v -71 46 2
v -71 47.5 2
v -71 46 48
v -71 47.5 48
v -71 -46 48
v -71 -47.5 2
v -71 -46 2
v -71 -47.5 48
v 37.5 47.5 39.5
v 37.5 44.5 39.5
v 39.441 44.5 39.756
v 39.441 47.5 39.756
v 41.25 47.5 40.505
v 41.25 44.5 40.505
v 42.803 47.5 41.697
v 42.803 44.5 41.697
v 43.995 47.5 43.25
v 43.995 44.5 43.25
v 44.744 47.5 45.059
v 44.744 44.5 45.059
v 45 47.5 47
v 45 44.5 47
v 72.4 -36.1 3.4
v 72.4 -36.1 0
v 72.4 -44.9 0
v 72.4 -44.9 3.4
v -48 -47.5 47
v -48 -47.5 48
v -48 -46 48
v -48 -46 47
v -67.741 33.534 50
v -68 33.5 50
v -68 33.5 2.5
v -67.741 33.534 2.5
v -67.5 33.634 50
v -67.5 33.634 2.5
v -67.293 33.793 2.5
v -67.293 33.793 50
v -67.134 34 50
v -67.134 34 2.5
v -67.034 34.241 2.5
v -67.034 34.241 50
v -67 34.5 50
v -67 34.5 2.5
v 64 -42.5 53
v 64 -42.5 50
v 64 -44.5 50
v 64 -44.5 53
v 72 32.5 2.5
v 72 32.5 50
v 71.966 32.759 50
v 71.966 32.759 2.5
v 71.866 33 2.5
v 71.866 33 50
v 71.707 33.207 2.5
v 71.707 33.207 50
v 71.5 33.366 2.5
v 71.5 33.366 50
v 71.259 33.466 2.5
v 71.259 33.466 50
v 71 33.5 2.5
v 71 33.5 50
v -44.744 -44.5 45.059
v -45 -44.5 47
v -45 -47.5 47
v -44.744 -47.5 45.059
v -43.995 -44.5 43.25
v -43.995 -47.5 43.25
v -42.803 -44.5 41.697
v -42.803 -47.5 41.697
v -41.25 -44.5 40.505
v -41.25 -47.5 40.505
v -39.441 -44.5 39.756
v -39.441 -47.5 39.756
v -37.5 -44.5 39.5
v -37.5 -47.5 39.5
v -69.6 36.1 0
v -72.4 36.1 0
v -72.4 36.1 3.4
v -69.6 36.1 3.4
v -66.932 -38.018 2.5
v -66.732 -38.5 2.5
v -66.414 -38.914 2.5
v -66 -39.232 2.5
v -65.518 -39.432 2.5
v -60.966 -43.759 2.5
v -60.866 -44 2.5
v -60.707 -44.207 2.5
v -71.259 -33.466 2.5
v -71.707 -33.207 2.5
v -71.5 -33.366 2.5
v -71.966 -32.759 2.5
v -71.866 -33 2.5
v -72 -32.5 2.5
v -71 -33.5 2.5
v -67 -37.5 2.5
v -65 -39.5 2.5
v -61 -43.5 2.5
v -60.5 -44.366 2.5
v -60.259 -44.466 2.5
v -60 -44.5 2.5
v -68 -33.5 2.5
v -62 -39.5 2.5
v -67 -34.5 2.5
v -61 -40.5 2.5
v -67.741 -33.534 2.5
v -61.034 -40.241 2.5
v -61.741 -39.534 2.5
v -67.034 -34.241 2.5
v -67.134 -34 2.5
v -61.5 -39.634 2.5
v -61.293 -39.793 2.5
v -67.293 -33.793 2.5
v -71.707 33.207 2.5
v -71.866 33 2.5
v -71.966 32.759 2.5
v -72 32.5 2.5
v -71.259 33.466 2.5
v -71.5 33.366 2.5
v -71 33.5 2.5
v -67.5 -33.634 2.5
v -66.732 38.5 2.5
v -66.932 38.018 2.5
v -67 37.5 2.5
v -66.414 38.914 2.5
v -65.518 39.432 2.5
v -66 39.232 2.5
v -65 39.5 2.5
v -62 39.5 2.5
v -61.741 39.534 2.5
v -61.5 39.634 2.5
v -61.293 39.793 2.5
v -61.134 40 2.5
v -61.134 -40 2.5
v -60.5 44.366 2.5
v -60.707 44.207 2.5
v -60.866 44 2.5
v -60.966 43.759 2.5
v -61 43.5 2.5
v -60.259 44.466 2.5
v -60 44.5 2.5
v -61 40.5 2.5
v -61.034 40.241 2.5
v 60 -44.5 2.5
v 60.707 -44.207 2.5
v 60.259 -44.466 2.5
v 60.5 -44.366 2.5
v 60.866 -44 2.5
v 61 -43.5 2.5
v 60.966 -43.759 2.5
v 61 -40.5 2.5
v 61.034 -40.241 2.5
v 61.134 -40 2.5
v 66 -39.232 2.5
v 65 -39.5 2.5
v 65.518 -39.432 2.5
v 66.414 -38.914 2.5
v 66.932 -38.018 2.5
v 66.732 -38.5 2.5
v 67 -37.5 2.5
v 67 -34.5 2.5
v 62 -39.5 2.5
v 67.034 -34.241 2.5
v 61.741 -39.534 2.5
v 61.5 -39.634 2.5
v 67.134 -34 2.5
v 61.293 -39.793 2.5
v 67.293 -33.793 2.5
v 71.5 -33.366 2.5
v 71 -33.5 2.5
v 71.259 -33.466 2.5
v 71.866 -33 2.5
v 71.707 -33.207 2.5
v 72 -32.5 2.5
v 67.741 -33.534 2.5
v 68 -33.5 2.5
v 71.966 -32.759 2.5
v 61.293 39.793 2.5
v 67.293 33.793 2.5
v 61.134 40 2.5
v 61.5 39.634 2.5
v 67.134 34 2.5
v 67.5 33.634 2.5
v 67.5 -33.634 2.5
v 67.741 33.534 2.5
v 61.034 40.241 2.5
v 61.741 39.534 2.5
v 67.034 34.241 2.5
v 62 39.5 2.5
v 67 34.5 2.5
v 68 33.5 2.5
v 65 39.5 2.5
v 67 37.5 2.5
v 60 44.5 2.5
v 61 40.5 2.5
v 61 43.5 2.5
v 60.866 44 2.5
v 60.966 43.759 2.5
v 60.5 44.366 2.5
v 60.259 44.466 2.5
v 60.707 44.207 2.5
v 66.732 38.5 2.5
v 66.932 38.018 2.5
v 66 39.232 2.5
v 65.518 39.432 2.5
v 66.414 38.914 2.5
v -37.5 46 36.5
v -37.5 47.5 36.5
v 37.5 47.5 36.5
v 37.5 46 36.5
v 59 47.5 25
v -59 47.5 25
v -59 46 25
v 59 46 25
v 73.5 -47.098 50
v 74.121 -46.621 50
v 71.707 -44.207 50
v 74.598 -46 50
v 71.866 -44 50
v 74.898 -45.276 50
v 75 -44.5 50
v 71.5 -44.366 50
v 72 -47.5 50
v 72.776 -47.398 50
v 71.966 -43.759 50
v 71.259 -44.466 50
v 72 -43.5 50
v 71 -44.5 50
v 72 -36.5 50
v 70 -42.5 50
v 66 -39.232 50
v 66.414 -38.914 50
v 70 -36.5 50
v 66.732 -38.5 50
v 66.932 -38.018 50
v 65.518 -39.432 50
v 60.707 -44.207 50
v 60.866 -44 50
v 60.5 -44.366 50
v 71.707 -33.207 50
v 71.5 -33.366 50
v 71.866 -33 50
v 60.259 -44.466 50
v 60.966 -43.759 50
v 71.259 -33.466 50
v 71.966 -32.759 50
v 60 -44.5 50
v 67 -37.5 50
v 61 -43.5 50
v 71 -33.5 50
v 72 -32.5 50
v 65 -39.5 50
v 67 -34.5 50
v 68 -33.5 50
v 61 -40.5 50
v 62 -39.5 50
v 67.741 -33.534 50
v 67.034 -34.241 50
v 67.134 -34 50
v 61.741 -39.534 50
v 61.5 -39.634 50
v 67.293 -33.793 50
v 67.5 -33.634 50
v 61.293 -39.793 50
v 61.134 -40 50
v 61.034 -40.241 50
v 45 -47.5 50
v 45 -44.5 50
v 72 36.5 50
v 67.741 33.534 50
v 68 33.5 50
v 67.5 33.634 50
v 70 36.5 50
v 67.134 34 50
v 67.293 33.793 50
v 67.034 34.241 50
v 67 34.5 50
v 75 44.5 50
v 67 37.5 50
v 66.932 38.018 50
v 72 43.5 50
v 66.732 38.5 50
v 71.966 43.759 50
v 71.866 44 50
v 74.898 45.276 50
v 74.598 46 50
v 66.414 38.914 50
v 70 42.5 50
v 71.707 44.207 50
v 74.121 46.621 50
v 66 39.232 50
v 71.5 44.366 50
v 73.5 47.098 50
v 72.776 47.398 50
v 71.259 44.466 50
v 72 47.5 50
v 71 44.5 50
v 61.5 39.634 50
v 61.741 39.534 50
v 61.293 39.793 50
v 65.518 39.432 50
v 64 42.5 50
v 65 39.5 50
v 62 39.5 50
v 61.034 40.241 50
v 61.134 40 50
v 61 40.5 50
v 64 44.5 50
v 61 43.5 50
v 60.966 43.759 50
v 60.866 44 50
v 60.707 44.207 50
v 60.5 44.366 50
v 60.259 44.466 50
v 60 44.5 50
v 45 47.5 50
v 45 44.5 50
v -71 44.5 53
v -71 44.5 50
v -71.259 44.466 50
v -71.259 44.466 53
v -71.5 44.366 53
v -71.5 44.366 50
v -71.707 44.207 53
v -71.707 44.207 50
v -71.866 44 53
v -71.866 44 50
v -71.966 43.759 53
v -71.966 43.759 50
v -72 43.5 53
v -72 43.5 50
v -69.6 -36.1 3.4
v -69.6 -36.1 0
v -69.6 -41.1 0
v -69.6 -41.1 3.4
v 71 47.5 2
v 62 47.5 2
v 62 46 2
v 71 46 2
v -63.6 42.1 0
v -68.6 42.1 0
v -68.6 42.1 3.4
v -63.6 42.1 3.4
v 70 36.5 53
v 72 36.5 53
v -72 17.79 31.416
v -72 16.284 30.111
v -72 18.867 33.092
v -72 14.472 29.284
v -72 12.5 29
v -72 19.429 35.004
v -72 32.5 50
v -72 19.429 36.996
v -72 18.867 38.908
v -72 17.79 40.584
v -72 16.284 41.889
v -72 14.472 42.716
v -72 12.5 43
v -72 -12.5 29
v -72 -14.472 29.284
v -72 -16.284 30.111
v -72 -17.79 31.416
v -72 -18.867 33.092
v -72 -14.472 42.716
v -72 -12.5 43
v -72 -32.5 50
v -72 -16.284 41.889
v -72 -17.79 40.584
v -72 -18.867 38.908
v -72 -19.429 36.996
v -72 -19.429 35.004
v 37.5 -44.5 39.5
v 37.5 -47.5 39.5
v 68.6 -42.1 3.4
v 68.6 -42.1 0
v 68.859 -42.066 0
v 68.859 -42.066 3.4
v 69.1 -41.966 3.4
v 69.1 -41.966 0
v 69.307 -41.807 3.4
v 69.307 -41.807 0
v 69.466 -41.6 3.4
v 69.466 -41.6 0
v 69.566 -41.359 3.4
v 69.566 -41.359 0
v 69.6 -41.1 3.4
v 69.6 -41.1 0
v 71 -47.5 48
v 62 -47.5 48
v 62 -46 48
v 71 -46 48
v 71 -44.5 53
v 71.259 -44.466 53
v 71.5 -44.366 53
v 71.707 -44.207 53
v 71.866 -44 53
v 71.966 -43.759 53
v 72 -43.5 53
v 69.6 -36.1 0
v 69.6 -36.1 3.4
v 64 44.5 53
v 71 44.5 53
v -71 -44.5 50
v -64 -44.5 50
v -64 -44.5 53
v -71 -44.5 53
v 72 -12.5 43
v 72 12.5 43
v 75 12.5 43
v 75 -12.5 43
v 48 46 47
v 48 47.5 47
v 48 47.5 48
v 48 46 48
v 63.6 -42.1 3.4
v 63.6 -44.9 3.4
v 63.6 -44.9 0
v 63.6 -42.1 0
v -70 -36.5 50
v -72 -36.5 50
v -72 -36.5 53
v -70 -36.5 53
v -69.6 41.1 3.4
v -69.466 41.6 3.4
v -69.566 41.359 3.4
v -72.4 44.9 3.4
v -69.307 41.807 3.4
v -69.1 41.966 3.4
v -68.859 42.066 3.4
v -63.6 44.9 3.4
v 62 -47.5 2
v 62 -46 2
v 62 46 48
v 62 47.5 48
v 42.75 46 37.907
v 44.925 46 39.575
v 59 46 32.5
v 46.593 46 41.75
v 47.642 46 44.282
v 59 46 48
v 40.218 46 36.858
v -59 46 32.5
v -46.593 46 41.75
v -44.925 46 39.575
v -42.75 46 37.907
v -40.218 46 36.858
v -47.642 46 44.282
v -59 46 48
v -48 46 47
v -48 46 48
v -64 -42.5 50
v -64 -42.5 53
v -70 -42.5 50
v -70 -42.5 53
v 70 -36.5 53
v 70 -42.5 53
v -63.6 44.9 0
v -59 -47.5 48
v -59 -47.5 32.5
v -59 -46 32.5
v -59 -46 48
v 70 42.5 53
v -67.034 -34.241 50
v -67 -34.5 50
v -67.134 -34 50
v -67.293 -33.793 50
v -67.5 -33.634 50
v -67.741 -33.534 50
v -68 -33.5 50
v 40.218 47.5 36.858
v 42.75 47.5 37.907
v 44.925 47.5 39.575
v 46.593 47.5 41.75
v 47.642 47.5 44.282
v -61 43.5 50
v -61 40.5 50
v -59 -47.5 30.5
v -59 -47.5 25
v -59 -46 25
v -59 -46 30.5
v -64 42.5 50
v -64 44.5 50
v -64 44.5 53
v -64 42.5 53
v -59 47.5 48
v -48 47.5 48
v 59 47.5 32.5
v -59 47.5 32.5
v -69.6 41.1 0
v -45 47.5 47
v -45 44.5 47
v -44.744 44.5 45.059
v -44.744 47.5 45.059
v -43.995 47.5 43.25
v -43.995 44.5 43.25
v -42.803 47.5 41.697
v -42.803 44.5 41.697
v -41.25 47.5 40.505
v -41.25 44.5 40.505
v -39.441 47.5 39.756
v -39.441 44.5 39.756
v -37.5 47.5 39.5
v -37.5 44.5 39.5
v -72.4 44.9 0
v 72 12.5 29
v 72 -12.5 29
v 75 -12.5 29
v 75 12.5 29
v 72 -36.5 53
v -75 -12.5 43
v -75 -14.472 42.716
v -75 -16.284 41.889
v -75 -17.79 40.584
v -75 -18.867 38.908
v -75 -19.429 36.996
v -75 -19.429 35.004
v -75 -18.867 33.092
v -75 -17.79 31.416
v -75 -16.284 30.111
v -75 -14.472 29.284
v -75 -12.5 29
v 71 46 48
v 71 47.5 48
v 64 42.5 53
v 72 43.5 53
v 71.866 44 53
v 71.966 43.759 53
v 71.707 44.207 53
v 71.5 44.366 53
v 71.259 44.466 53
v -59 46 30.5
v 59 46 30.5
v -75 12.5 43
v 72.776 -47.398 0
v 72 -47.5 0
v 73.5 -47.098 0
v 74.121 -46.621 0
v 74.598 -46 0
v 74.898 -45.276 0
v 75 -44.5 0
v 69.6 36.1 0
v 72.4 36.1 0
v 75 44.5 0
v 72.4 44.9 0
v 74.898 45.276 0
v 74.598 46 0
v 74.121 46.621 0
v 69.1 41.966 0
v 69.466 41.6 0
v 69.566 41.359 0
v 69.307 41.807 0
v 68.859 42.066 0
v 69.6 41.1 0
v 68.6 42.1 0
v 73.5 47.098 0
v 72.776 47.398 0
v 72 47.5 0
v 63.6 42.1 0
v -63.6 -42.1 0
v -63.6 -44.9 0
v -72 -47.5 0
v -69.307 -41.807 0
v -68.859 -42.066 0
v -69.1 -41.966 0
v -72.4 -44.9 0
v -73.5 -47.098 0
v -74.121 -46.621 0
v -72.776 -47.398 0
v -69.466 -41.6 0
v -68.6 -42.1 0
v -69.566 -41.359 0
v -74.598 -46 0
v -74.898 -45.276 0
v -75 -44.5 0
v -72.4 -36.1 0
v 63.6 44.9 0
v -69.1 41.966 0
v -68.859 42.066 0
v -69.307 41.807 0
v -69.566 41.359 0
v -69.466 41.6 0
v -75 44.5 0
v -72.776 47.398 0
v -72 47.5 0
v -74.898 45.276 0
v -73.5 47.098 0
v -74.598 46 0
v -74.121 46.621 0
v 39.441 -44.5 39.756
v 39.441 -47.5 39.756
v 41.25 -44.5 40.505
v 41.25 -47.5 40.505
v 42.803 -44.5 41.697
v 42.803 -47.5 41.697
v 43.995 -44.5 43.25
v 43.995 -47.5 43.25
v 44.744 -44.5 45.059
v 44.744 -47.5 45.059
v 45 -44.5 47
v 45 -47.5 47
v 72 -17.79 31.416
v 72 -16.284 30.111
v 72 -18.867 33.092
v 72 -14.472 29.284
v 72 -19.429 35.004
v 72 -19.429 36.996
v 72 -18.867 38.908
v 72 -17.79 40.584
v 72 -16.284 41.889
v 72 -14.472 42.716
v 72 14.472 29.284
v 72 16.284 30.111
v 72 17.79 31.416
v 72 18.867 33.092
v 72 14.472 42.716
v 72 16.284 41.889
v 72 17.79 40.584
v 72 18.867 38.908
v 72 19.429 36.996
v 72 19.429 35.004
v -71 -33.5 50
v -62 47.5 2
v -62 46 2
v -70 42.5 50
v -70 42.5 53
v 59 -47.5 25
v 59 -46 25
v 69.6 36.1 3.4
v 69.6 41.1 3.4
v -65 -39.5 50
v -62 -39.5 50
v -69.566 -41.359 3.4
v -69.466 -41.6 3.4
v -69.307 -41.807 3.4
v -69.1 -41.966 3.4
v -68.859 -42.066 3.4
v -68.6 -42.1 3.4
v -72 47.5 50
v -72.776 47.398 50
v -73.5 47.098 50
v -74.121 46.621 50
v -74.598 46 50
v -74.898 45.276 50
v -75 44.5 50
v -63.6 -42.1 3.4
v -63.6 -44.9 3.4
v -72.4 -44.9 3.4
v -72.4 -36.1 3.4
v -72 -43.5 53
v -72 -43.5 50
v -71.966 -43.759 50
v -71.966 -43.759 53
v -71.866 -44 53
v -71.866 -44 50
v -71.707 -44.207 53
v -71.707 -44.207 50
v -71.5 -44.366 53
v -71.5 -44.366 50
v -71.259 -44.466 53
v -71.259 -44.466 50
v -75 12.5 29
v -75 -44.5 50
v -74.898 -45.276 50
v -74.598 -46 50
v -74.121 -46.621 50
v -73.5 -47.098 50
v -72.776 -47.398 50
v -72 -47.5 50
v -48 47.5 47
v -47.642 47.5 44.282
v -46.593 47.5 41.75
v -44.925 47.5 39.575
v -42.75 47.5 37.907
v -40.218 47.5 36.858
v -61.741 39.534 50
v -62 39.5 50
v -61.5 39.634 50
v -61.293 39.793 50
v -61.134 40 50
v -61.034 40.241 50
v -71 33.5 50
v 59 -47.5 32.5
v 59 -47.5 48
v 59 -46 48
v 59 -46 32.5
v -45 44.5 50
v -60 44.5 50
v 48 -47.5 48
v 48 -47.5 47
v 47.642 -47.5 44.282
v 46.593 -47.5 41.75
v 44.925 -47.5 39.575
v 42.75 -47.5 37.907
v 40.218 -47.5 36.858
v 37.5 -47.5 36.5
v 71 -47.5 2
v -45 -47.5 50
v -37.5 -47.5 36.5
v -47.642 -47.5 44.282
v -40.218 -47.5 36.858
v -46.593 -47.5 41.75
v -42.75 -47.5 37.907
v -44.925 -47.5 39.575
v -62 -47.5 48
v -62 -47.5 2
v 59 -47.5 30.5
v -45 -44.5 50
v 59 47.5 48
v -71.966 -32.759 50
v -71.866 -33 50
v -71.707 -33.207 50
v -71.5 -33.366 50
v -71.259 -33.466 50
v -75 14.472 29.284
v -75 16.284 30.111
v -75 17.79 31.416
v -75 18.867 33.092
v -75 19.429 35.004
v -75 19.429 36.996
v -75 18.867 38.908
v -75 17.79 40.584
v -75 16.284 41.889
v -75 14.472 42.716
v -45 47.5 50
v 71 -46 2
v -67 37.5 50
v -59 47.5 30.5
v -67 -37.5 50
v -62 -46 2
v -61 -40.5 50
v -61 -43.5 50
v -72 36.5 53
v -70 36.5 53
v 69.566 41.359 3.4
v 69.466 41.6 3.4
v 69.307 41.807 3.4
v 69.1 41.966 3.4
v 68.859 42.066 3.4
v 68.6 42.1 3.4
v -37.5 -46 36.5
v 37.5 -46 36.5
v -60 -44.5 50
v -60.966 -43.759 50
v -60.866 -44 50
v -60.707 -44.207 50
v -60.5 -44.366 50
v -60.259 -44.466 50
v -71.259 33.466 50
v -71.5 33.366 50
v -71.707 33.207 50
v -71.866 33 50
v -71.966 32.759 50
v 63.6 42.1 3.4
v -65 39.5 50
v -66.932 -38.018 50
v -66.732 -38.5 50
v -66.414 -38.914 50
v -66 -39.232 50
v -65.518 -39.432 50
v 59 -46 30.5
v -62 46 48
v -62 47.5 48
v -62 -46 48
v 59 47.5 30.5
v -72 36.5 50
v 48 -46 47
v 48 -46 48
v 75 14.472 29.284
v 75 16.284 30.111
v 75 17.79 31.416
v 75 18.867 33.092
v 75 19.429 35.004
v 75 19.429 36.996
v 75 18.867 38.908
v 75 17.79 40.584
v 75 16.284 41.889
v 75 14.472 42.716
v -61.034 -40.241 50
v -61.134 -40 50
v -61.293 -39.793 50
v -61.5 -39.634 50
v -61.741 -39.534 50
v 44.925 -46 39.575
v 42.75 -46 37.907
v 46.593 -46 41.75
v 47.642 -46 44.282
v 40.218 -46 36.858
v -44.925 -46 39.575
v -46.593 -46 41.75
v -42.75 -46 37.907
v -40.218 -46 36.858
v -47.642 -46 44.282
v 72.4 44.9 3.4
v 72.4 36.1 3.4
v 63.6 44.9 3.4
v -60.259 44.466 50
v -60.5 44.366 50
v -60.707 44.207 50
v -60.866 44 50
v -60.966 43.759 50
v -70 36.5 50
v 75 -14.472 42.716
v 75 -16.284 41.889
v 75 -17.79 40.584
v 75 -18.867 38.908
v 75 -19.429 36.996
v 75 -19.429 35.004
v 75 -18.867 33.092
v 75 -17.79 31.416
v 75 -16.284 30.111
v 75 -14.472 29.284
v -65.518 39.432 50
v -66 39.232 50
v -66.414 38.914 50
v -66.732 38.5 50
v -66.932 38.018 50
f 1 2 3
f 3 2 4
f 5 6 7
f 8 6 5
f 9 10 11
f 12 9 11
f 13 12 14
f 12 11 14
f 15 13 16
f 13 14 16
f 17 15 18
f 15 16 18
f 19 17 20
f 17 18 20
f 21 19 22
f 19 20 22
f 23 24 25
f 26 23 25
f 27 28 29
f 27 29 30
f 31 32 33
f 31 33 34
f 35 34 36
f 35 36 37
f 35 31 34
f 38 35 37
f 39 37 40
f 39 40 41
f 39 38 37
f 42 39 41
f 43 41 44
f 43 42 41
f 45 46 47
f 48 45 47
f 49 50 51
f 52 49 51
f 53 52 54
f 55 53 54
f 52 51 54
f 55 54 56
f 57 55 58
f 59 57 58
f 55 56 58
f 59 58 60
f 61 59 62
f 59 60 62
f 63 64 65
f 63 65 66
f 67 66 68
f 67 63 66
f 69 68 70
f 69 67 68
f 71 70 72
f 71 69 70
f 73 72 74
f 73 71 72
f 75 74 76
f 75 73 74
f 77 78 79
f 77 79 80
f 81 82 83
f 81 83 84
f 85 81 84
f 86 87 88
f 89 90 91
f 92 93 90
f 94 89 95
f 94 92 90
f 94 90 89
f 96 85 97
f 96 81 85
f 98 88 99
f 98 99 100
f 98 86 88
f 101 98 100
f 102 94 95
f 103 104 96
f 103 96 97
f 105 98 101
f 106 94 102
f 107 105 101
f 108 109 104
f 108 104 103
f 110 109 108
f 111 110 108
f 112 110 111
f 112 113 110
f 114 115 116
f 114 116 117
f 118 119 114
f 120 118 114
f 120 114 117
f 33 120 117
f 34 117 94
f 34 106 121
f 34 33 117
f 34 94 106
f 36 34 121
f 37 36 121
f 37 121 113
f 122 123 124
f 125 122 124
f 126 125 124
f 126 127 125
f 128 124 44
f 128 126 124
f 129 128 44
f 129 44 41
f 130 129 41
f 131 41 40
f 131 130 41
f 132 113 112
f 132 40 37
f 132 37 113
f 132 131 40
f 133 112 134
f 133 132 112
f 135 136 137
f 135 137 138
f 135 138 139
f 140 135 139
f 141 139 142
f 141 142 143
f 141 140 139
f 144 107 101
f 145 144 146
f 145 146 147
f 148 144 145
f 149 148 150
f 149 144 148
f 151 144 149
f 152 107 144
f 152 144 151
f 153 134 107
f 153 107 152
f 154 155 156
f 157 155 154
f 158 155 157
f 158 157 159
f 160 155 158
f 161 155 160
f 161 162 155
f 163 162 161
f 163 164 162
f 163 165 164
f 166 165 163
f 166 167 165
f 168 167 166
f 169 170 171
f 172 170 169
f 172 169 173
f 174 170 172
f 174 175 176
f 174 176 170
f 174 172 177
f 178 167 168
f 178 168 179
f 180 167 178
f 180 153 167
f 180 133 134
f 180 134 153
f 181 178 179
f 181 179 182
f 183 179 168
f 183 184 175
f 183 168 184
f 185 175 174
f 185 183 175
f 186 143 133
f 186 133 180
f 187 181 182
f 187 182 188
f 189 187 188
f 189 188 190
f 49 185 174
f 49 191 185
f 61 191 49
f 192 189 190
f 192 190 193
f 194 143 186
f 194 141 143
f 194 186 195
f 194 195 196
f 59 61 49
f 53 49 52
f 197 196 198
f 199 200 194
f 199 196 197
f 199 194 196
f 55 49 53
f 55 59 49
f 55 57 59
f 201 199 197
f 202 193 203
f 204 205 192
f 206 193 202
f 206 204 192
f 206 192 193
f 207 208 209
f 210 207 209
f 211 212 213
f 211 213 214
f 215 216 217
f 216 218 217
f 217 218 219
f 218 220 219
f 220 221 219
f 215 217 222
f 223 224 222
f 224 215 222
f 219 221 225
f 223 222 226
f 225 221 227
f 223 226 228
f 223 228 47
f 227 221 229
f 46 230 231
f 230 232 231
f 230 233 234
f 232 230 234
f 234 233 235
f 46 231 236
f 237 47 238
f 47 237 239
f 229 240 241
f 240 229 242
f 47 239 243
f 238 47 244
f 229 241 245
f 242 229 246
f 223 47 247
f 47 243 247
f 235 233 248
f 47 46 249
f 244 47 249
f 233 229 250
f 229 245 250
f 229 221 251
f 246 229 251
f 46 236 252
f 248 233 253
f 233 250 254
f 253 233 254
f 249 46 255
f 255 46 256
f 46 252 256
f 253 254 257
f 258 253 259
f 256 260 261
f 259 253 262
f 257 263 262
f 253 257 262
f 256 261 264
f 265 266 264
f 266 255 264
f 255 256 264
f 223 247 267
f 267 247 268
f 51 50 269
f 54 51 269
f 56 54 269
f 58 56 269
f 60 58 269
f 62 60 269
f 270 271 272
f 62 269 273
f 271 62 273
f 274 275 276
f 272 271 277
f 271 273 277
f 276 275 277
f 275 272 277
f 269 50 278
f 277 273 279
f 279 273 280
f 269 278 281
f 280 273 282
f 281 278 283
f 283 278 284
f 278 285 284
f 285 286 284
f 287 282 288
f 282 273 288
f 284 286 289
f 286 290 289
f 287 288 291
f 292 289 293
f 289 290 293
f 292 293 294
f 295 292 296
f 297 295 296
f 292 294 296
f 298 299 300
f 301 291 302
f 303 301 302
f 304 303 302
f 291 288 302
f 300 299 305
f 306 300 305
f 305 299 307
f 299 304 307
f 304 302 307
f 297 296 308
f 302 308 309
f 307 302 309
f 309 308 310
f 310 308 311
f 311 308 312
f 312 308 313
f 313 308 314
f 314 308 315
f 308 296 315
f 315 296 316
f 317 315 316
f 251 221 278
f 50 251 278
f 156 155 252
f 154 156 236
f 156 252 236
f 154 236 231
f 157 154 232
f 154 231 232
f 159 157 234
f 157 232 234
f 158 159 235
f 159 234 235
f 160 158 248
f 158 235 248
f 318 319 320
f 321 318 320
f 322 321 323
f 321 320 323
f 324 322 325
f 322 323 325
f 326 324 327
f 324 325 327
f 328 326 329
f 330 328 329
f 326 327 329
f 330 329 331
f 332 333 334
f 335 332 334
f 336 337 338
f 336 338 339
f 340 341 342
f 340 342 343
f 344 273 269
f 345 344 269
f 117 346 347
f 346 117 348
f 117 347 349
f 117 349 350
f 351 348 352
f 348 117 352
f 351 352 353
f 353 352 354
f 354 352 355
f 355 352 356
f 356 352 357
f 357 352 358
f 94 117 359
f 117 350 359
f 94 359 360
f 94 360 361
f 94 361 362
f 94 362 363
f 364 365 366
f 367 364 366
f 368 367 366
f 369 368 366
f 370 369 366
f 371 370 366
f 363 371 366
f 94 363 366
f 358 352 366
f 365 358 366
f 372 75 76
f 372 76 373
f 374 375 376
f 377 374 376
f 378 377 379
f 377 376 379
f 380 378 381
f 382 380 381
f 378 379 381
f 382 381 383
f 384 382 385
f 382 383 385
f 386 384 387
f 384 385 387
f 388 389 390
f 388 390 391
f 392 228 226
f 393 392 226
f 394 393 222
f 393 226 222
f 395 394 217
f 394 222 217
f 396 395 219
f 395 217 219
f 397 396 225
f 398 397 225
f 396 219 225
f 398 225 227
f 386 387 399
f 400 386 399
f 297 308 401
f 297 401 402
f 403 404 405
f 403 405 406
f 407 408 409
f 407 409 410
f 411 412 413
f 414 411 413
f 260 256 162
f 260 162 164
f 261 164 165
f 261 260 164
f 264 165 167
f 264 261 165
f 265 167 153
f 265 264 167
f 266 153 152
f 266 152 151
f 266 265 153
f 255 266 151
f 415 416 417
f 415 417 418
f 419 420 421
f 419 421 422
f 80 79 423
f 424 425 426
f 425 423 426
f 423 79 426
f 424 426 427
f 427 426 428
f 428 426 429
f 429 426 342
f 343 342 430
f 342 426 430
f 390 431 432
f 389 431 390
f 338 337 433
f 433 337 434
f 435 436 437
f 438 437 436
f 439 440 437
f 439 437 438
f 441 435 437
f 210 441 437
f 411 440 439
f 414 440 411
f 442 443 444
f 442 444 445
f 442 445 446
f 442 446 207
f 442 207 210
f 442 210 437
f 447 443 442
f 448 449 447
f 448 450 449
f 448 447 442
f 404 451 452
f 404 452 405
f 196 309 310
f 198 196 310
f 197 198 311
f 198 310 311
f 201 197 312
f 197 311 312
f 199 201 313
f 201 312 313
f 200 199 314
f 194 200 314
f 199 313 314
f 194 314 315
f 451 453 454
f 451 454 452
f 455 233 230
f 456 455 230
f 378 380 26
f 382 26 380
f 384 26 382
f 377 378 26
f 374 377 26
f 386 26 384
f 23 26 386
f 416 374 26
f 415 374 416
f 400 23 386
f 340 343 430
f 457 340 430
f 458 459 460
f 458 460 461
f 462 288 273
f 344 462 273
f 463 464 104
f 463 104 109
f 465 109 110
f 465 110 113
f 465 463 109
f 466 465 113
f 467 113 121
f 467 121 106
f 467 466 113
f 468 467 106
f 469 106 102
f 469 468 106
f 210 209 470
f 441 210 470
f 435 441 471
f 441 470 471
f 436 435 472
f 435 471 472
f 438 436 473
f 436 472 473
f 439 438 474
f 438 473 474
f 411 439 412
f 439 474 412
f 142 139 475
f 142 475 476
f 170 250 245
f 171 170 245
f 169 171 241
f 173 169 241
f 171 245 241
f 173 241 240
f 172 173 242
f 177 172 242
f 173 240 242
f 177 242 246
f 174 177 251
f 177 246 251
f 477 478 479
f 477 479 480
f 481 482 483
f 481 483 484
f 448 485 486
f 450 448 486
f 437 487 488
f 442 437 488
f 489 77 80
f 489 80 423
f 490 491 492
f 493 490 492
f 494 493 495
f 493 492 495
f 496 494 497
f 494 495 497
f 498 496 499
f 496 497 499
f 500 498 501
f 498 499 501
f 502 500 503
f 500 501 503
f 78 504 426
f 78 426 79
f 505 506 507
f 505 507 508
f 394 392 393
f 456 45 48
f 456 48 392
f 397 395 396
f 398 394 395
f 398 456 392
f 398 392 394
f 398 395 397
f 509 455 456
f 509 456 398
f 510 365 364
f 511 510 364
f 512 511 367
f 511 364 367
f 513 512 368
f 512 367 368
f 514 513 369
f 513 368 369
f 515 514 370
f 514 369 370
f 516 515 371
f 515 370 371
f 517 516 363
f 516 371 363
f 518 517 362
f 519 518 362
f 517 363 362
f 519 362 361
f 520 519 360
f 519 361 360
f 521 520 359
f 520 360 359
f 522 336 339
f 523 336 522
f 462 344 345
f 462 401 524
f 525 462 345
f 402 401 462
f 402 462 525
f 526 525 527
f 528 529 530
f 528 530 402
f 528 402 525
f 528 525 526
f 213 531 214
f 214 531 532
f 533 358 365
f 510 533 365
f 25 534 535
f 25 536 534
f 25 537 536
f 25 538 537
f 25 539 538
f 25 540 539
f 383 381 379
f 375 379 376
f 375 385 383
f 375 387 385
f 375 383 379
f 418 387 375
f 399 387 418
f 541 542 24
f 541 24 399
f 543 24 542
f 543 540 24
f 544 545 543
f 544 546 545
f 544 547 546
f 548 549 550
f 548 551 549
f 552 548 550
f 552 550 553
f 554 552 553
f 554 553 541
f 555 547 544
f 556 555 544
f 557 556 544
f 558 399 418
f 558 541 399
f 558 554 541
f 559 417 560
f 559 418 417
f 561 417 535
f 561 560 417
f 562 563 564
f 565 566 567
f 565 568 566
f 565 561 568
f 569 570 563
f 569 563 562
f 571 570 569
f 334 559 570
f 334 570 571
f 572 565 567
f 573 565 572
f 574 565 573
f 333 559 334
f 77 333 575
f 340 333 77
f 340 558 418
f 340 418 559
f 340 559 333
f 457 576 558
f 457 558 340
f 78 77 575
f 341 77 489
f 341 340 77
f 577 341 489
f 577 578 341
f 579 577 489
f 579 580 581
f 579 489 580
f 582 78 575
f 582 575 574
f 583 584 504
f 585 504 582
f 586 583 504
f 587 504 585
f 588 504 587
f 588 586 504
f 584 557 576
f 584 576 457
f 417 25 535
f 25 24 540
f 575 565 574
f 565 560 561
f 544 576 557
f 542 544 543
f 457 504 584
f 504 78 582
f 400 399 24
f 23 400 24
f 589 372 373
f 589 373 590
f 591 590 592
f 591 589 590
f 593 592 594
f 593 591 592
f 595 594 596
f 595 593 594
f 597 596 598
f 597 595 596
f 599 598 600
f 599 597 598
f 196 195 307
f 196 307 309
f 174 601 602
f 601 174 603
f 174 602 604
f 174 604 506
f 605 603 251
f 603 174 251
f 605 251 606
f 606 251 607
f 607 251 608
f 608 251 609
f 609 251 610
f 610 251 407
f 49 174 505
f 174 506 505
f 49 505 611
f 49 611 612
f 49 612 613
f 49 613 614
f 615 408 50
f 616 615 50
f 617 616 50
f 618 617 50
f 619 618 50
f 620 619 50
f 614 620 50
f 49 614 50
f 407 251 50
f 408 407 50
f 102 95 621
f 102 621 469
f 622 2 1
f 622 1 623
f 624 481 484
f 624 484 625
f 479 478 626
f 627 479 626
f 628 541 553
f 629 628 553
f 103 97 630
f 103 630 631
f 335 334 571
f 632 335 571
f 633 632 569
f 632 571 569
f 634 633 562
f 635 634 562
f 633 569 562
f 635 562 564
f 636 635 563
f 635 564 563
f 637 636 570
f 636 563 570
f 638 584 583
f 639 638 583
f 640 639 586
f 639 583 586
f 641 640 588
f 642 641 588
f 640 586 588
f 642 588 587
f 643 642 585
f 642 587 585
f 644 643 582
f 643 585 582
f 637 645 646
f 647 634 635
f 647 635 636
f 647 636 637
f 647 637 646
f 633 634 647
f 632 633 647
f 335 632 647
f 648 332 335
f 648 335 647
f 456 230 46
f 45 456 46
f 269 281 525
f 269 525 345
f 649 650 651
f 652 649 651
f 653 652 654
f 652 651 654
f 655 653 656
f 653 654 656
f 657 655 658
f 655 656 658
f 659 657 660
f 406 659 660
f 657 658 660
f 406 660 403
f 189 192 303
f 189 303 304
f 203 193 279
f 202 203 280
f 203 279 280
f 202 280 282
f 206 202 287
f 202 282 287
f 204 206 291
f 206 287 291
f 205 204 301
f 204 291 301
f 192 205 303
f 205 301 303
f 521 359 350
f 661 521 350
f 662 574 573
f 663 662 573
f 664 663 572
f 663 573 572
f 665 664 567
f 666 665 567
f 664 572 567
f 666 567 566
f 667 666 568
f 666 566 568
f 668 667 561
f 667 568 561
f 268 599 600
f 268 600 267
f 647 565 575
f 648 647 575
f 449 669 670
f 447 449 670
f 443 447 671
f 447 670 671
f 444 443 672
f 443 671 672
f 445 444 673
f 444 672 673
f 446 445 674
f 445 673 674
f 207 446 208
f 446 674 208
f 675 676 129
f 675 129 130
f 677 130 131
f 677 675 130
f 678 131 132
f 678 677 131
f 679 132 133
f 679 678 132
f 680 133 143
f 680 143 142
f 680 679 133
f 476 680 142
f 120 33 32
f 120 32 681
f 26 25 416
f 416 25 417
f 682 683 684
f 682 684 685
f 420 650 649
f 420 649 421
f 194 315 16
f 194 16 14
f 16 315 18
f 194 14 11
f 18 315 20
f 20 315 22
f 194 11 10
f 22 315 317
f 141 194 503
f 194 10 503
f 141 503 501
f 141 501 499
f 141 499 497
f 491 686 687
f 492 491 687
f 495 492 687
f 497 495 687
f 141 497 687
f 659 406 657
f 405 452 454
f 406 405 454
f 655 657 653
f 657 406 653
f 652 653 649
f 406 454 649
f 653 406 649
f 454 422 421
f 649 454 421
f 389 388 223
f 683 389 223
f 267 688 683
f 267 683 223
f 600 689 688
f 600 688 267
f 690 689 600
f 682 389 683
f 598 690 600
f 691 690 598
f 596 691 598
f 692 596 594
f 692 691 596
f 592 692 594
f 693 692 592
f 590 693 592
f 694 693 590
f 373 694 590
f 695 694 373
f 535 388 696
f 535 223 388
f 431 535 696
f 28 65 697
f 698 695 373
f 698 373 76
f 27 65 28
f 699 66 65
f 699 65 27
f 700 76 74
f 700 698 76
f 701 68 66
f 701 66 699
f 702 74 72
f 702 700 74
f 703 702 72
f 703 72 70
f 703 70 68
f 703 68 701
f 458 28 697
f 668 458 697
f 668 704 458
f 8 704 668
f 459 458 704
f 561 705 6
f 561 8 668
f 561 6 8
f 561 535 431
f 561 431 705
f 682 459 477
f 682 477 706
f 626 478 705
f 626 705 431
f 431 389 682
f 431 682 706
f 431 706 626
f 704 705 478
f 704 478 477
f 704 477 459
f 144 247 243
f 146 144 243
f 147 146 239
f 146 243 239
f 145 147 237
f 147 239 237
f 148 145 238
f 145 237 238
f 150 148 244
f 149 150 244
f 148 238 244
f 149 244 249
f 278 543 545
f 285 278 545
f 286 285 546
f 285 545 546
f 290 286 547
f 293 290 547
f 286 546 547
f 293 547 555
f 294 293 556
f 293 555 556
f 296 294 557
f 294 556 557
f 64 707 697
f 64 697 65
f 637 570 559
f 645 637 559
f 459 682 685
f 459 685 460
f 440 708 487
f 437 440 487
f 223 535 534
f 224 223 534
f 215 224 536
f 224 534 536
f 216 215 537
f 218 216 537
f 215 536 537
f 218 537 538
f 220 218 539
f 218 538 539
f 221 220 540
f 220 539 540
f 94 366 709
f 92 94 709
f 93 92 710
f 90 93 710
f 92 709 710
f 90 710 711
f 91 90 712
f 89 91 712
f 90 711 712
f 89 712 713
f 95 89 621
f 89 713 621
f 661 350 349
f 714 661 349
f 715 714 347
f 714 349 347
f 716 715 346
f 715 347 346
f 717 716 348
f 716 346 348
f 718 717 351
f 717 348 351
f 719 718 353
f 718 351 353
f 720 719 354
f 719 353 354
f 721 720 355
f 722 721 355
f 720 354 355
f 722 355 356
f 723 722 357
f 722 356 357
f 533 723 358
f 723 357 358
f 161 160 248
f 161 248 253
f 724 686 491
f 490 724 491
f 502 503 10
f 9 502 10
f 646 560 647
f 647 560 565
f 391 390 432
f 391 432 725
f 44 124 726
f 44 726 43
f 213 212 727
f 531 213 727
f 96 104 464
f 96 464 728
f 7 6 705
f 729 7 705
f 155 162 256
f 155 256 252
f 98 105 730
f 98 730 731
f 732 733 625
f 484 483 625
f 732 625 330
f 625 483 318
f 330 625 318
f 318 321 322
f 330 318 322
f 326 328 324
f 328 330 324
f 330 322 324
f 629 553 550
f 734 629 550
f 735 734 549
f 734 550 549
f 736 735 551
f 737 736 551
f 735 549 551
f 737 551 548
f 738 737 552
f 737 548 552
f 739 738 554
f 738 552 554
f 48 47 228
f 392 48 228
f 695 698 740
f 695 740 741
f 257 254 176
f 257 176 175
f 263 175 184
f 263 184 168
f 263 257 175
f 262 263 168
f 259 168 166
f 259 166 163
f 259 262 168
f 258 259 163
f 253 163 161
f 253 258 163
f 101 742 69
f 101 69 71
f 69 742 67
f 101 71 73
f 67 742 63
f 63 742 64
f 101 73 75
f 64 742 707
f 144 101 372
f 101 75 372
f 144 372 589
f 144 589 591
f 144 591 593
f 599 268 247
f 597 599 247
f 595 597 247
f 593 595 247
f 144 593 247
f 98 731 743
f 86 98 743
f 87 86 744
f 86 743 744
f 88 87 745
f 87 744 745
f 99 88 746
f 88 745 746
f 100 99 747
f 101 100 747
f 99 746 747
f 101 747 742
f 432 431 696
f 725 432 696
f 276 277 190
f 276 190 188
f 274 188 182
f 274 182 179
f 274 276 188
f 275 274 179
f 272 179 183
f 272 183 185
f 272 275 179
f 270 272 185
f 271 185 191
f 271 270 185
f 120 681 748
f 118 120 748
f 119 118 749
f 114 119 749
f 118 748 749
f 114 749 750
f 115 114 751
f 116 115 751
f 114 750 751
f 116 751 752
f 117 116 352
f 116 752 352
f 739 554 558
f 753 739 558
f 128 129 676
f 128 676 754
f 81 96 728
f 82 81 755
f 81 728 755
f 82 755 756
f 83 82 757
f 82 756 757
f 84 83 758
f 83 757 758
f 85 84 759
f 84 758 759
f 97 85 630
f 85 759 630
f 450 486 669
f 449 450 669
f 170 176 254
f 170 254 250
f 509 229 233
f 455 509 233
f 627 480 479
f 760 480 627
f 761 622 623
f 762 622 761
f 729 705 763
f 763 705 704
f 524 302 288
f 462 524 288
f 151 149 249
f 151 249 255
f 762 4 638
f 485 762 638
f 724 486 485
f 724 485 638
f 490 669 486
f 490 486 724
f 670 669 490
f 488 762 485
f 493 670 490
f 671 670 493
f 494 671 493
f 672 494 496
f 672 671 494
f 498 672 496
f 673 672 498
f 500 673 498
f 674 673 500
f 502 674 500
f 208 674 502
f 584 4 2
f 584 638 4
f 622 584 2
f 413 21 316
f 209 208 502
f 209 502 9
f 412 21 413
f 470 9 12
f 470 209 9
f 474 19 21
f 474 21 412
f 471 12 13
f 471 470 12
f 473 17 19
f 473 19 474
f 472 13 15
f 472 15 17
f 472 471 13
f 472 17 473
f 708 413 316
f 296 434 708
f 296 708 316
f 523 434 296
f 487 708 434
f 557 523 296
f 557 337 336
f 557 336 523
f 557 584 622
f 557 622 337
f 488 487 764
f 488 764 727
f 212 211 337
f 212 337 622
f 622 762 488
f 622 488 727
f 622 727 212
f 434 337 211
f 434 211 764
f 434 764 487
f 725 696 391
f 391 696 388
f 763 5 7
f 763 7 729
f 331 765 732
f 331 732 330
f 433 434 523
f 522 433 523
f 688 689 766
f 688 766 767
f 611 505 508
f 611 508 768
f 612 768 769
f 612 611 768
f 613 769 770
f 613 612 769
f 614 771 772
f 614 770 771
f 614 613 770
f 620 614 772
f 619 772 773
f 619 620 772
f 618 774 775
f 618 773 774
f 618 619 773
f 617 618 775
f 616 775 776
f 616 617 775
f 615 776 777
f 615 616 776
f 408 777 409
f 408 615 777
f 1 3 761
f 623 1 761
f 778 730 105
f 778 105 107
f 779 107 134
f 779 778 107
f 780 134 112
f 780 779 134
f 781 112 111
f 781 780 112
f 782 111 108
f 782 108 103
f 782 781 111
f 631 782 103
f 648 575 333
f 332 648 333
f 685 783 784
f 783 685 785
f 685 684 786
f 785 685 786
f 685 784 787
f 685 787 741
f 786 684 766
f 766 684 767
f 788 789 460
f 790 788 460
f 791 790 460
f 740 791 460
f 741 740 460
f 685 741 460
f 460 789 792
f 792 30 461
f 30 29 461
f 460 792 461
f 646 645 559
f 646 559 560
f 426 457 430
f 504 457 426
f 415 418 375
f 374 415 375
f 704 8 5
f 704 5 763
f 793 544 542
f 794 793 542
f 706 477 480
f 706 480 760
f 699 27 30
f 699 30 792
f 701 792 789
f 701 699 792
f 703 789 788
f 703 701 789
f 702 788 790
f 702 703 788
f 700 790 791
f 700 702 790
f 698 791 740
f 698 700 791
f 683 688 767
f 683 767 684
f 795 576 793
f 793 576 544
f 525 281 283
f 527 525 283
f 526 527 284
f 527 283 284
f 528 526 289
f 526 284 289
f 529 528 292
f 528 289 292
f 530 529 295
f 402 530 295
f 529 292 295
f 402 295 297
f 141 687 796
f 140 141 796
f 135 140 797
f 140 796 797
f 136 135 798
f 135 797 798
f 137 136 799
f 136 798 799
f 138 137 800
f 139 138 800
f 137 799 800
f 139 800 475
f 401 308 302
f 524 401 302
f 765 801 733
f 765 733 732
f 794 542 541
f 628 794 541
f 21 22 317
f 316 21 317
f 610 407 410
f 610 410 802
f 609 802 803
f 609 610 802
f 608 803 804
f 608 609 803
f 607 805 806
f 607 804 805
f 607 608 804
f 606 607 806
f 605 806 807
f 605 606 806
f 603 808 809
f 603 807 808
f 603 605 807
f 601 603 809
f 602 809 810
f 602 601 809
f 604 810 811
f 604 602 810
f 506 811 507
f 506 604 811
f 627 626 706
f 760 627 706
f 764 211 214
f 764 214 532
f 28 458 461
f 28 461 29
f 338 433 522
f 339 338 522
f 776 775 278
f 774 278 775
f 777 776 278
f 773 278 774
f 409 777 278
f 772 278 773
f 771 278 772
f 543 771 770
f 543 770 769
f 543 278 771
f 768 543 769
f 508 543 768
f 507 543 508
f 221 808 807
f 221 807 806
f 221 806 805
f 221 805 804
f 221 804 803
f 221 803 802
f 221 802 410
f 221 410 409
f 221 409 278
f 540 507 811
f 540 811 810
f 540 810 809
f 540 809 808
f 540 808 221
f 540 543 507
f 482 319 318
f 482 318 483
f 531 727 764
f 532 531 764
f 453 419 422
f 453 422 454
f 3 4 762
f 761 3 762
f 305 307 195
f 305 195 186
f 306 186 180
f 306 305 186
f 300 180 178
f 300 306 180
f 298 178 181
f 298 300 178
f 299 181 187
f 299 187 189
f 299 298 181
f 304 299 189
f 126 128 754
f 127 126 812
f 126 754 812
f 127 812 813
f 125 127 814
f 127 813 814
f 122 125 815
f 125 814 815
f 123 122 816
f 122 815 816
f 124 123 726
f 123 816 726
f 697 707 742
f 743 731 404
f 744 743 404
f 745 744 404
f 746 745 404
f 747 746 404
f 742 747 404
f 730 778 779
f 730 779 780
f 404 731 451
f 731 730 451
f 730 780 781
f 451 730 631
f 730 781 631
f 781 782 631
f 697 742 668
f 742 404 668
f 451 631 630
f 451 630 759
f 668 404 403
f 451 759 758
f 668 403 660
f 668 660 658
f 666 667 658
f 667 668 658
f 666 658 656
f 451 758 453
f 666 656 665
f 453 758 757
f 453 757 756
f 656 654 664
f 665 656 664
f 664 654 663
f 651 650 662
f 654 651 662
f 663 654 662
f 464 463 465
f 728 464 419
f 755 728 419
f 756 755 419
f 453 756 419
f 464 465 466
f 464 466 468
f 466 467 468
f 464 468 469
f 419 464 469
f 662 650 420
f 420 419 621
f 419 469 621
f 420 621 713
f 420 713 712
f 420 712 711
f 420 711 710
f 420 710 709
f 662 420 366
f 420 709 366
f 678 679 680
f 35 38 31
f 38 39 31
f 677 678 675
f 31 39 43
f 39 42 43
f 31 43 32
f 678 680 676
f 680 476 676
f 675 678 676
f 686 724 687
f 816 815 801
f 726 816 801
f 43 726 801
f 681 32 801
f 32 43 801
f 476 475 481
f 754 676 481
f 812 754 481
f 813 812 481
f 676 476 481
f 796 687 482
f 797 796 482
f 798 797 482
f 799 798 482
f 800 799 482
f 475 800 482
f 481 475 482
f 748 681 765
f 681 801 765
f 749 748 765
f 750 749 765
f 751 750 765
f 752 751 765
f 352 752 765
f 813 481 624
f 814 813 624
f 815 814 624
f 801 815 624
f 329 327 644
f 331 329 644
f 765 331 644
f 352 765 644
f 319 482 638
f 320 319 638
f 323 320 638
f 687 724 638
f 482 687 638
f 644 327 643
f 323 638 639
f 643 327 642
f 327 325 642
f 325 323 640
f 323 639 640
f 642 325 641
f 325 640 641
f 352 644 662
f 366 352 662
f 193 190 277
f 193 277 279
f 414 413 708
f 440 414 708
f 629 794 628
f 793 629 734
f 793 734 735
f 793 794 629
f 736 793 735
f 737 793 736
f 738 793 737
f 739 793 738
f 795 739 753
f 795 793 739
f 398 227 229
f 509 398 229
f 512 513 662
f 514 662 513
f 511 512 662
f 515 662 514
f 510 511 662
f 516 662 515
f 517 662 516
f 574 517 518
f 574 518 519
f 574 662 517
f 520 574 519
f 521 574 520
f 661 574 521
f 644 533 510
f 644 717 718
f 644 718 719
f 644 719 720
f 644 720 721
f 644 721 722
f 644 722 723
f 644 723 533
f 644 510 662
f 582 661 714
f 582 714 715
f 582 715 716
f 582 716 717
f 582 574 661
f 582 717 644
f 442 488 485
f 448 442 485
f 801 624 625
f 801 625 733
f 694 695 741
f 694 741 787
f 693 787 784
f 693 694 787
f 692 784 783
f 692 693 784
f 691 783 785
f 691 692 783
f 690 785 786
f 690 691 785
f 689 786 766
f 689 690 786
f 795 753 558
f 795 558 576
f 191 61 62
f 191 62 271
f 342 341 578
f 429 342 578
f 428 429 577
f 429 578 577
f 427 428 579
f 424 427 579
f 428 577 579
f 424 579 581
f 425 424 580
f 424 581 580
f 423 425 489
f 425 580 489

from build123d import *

# Parameters (mm, degrees)
PAD_DEPTH            = 50
POCKET_DEPTH         = 47.5
PAD001_DEPTH         = 3
POCKET001_DEPTH      = 3.4
POCKET002_DEPTH      = 47.501
POCKET002_DEPTH_BACK = -47.501
POCKET003_DEPTH      = 75.001
POCKET003_DEPTH_BACK = -75.001
SKETCH009_W          = 9
SKETCH009_H          = 46
SKETCH009_W_2        = 118
SKETCH009_H_2        = 5.5
POCKET004_DEPTH      = 1.5


with BuildPart() as part:
    # Sketch003 → Pad (new body)
    with BuildSketch(Plane.XY):
        with BuildLine():
            Line((-72, 47.5), (72, 47.5))
            ThreePointArc((75, 44.5), (74.12132, 46.62132), (72, 47.5))
            Line((75, 44.5), (75, -44.5))
            ThreePointArc((72, -47.5), (74.12132, -46.62132), (75, -44.5))
            Line((72, -47.5), (-72, -47.5))
            ThreePointArc((-75, -44.5), (-74.12132, -46.62132), (-72, -47.5))
            Line((-75, -44.5), (-75, 44.5))
            ThreePointArc((-72, 47.5), (-74.12132, 46.62132), (-75, 44.5))
        make_face()
    extrude(amount=PAD_DEPTH)

    # Sketch004 → Pocket (cut)
    with BuildSketch(Plane.XY.offset(50)):
        with BuildLine():
            Line((-72, 32.5), (-72, -32.5))
            ThreePointArc((-72, -32.5), (-71.707107, -33.207107), (-71, -33.5))
            Line((-71, -33.5), (-68, -33.5))
            ThreePointArc((-67, -34.5), (-67.292893, -33.792893), (-68, -33.5))
            Line((-67, -34.5), (-67, -37.5))
            ThreePointArc((-67, -37.5), (-66.414214, -38.914214), (-65, -39.5))
            Line((-65, -39.5), (-62, -39.5))
            ThreePointArc((-61, -40.5), (-61.292893, -39.792893), (-62, -39.5))
            Line((-61, -40.5), (-61, -43.5))
            ThreePointArc((-61, -43.5), (-60.707107, -44.207107), (-60, -44.5))
            Line((-60, -44.5), (60, -44.5))
            ThreePointArc((60, -44.5), (60.707107, -44.207107), (61, -43.5))
            Line((61, -43.5), (61, -40.5))
            ThreePointArc((62, -39.5), (61.292893, -39.792893), (61, -40.5))
            Line((62, -39.5), (65, -39.5))
            ThreePointArc((65, -39.5), (66.414214, -38.914214), (67, -37.5))
            Line((67, -37.5), (67, -34.5))
            ThreePointArc((68, -33.5), (67.292893, -33.792893), (67, -34.5))
            Line((68, -33.5), (71, -33.5))
            ThreePointArc((71, -33.5), (71.707107, -33.207107), (72, -32.5))
            Line((72, -32.5), (72, 32.5))
            ThreePointArc((72, 32.5), (71.707107, 33.207107), (71, 33.5))
            Line((71, 33.5), (68, 33.5))
            ThreePointArc((67, 34.5), (67.292893, 33.792893), (68, 33.5))
            Line((67, 34.5), (67, 37.5))
            ThreePointArc((67, 37.5), (66.414214, 38.914214), (65, 39.5))
            Line((65, 39.5), (62, 39.5))
            ThreePointArc((61, 40.5), (61.292893, 39.792893), (62, 39.5))
            Line((61, 40.5), (61, 43.5))
            ThreePointArc((61, 43.5), (60.707107, 44.207107), (60, 44.5))
            Line((60, 44.5), (-60, 44.5))
            ThreePointArc((-60, 44.5), (-60.707107, 44.207107), (-61, 43.5))
            Line((-61, 43.5), (-61, 40.5))
            ThreePointArc((-62, 39.5), (-61.292893, 39.792893), (-61, 40.5))
            Line((-62, 39.5), (-65, 39.5))
            ThreePointArc((-65, 39.5), (-66.414214, 38.914214), (-67, 37.5))
            Line((-67, 37.5), (-67, 34.5))
            ThreePointArc((-68, 33.5), (-67.292893, 33.792893), (-67, 34.5))
            Line((-68, 33.5), (-71, 33.5))
            ThreePointArc((-71, 33.5), (-71.707107, 33.207107), (-72, 32.5))
        make_face()
    extrude(amount=-POCKET_DEPTH, mode=Mode.SUBTRACT)

    # Sketch005 → Pad001 (join)
    with BuildSketch(Plane.XY.offset(50)):
        with BuildLine():
            Line((-70, 42.5), (-70, 36.5))
            Line((-70, 36.5), (-72, 36.5))
            Line((-72, 36.5), (-72, 43.5))
            ThreePointArc((-71, 44.5), (-71.707107, 44.207107), (-72, 43.5))
            Line((-71, 44.5), (-64, 44.5))
            Line((-64, 44.5), (-64, 42.5))
            Line((-64, 42.5), (-70, 42.5))
        make_face()
        with BuildLine():
            Line((64, 42.5), (70, 42.5))
            Line((70, 42.5), (70, 36.5))
            Line((70, 36.5), (72, 36.5))
            Line((72, 43.5), (72, 36.5))
            ThreePointArc((72, 43.5), (71.707107, 44.207107), (71, 44.5))
            Line((64, 44.5), (71, 44.5))
            Line((64, 44.5), (64, 42.5))
        make_face()
        with BuildLine():
            Line((72, -36.5), (70, -36.5))
            Line((70, -36.5), (70, -42.5))
            Line((70, -42.5), (64, -42.5))
            Line((64, -42.5), (64, -44.5))
            Line((64, -44.5), (71, -44.5))
            ThreePointArc((71, -44.5), (71.707107, -44.207107), (72, -43.5))
            Line((72, -43.5), (72, -36.5))
        make_face()
        with BuildLine():
            Line((-70, -36.5), (-70, -42.5))
            Line((-70, -42.5), (-64, -42.5))
            Line((-64, -42.5), (-64, -44.5))
            Line((-64, -44.5), (-71, -44.5))
            ThreePointArc((-72, -43.5), (-71.707107, -44.207107), (-71, -44.5))
            Line((-72, -43.5), (-72, -36.5))
            Line((-72, -36.5), (-70, -36.5))
        make_face()
    extrude(amount=PAD001_DEPTH)

    # Sketch006 → Pocket001 (cut)
    with BuildSketch(Plane.XY):
        with BuildLine():
            Line((-72.4, 44.9), (-72.4, 36.1))
            Line((-72.4, 36.1), (-69.6, 36.1))
            Line((-69.6, 36.1), (-69.6, 41.1))
            ThreePointArc((-68.6, 42.1), (-69.307107, 41.807107), (-69.6, 41.1))
            Line((-68.6, 42.1), (-63.6, 42.1))
            Line((-63.6, 42.1), (-63.6, 44.9))
            Line((-63.6, 44.9), (-72.4, 44.9))
        make_face()
        with BuildLine():
            Line((63.6, 44.9), (72.4, 44.9))
            Line((72.4, 44.9), (72.4, 36.1))
            Line((72.4, 36.1), (69.6, 36.1))
            Line((69.6, 36.1), (69.6, 41.1))
            ThreePointArc((69.6, 41.1), (69.307107, 41.807107), (68.6, 42.1))
            Line((68.6, 42.1), (63.6, 42.1))
            Line((63.6, 42.1), (63.6, 44.9))
        make_face()
        with BuildLine():
            Line((69.6, -36.1), (72.4, -36.1))
            Line((72.4, -36.1), (72.4, -44.9))
            Line((72.4, -44.9), (63.6, -44.9))
            Line((63.6, -44.9), (63.6, -42.1))
            Line((63.6, -42.1), (68.6, -42.1))
            ThreePointArc((68.6, -42.1), (69.307107, -41.807107), (69.6, -41.1))
            Line((69.6, -41.1), (69.6, -36.1))
        make_face()
        with BuildLine():
            Line((-63.6, -42.1), (-63.6, -44.9))
            Line((-63.6, -44.9), (-72.4, -44.9))
            Line((-72.4, -44.9), (-72.4, -36.1))
            Line((-72.4, -36.1), (-69.6, -36.1))
            Line((-69.6, -36.1), (-69.6, -41.1))
            ThreePointArc((-69.6, -41.1), (-69.307107, -41.807107), (-68.6, -42.1))
            Line((-68.6, -42.1), (-63.6, -42.1))
        make_face()
    extrude(amount=POCKET001_DEPTH, mode=Mode.SUBTRACT)

    # Sketch007 → Pocket002 (cut, two sides)
    with BuildSketch(Plane.XZ) as pocket002_sk:
        with BuildLine():
            Line((-45, 53), (-45, 47))
            ThreePointArc((-45, 47), (-42.803301, 41.696699), (-37.5, 39.5))
            Line((-37.5, 39.5), (37.5, 39.5))
            ThreePointArc((37.5, 39.5), (42.803301, 41.696699), (45, 47))
            Line((45, 47), (45, 50))
            Line((45, 53), (45, 50))
            Line((-45, 53), (45, 53))
        make_face()
    extrude(amount=-POCKET002_DEPTH, mode=Mode.SUBTRACT)
    extrude(pocket002_sk.sketch, amount=-POCKET002_DEPTH_BACK, mode=Mode.SUBTRACT)

    # Sketch008 → Pocket003 (cut, two sides)
    with BuildSketch(Plane.YZ) as pocket003_sk:
        with BuildLine():
            ThreePointArc((-12.5, 43), (-19.5, 36), (-12.5, 29))
            Line((-12.5, 29), (12.5, 29))
            ThreePointArc((12.5, 29), (19.5, 36), (12.5, 43))
            Line((12.5, 43), (-12.5, 43))
        make_face()
    extrude(amount=-POCKET003_DEPTH, mode=Mode.SUBTRACT)
    extrude(pocket003_sk.sketch, amount=-POCKET003_DEPTH_BACK, mode=Mode.SUBTRACT)

    # Sketch009 → Pocket004 (cut)
    with BuildSketch(Plane.XZ.offset(47.5)):
        with Locations((-66.5, 25)):
            Rectangle(SKETCH009_W, SKETCH009_H)
        with Locations((66.5, 25)):
            Rectangle(SKETCH009_W, SKETCH009_H)
        with BuildLine():
            ThreePointArc((-48, 47), (-44.924621, 39.575379), (-37.5, 36.5))
            Line((-37.5, 36.5), (37.5, 36.5))
            ThreePointArc((37.5, 36.5), (44.924621, 39.575379), (48, 47))
            Line((48, 47), (48, 48))
            Line((48, 48), (59, 48))
            Line((59, 48), (59, 32.5))
            Line((59, 32.5), (-59, 32.5))
            Line((-59, 32.5), (-59, 48))
            Line((-59, 48), (-48, 48))
            Line((-48, 48), (-48, 47))
        make_face()
        with Locations((0, 27.75)):
            Rectangle(SKETCH009_W_2, SKETCH009_H_2)
    pocket004 = extrude(amount=-POCKET004_DEPTH, mode=Mode.SUBTRACT)

    # Mirrored: Pocket004 across XZ
    add(pocket004.mirror(Plane.XZ), mode=Mode.SUBTRACT)


solid = part.part
